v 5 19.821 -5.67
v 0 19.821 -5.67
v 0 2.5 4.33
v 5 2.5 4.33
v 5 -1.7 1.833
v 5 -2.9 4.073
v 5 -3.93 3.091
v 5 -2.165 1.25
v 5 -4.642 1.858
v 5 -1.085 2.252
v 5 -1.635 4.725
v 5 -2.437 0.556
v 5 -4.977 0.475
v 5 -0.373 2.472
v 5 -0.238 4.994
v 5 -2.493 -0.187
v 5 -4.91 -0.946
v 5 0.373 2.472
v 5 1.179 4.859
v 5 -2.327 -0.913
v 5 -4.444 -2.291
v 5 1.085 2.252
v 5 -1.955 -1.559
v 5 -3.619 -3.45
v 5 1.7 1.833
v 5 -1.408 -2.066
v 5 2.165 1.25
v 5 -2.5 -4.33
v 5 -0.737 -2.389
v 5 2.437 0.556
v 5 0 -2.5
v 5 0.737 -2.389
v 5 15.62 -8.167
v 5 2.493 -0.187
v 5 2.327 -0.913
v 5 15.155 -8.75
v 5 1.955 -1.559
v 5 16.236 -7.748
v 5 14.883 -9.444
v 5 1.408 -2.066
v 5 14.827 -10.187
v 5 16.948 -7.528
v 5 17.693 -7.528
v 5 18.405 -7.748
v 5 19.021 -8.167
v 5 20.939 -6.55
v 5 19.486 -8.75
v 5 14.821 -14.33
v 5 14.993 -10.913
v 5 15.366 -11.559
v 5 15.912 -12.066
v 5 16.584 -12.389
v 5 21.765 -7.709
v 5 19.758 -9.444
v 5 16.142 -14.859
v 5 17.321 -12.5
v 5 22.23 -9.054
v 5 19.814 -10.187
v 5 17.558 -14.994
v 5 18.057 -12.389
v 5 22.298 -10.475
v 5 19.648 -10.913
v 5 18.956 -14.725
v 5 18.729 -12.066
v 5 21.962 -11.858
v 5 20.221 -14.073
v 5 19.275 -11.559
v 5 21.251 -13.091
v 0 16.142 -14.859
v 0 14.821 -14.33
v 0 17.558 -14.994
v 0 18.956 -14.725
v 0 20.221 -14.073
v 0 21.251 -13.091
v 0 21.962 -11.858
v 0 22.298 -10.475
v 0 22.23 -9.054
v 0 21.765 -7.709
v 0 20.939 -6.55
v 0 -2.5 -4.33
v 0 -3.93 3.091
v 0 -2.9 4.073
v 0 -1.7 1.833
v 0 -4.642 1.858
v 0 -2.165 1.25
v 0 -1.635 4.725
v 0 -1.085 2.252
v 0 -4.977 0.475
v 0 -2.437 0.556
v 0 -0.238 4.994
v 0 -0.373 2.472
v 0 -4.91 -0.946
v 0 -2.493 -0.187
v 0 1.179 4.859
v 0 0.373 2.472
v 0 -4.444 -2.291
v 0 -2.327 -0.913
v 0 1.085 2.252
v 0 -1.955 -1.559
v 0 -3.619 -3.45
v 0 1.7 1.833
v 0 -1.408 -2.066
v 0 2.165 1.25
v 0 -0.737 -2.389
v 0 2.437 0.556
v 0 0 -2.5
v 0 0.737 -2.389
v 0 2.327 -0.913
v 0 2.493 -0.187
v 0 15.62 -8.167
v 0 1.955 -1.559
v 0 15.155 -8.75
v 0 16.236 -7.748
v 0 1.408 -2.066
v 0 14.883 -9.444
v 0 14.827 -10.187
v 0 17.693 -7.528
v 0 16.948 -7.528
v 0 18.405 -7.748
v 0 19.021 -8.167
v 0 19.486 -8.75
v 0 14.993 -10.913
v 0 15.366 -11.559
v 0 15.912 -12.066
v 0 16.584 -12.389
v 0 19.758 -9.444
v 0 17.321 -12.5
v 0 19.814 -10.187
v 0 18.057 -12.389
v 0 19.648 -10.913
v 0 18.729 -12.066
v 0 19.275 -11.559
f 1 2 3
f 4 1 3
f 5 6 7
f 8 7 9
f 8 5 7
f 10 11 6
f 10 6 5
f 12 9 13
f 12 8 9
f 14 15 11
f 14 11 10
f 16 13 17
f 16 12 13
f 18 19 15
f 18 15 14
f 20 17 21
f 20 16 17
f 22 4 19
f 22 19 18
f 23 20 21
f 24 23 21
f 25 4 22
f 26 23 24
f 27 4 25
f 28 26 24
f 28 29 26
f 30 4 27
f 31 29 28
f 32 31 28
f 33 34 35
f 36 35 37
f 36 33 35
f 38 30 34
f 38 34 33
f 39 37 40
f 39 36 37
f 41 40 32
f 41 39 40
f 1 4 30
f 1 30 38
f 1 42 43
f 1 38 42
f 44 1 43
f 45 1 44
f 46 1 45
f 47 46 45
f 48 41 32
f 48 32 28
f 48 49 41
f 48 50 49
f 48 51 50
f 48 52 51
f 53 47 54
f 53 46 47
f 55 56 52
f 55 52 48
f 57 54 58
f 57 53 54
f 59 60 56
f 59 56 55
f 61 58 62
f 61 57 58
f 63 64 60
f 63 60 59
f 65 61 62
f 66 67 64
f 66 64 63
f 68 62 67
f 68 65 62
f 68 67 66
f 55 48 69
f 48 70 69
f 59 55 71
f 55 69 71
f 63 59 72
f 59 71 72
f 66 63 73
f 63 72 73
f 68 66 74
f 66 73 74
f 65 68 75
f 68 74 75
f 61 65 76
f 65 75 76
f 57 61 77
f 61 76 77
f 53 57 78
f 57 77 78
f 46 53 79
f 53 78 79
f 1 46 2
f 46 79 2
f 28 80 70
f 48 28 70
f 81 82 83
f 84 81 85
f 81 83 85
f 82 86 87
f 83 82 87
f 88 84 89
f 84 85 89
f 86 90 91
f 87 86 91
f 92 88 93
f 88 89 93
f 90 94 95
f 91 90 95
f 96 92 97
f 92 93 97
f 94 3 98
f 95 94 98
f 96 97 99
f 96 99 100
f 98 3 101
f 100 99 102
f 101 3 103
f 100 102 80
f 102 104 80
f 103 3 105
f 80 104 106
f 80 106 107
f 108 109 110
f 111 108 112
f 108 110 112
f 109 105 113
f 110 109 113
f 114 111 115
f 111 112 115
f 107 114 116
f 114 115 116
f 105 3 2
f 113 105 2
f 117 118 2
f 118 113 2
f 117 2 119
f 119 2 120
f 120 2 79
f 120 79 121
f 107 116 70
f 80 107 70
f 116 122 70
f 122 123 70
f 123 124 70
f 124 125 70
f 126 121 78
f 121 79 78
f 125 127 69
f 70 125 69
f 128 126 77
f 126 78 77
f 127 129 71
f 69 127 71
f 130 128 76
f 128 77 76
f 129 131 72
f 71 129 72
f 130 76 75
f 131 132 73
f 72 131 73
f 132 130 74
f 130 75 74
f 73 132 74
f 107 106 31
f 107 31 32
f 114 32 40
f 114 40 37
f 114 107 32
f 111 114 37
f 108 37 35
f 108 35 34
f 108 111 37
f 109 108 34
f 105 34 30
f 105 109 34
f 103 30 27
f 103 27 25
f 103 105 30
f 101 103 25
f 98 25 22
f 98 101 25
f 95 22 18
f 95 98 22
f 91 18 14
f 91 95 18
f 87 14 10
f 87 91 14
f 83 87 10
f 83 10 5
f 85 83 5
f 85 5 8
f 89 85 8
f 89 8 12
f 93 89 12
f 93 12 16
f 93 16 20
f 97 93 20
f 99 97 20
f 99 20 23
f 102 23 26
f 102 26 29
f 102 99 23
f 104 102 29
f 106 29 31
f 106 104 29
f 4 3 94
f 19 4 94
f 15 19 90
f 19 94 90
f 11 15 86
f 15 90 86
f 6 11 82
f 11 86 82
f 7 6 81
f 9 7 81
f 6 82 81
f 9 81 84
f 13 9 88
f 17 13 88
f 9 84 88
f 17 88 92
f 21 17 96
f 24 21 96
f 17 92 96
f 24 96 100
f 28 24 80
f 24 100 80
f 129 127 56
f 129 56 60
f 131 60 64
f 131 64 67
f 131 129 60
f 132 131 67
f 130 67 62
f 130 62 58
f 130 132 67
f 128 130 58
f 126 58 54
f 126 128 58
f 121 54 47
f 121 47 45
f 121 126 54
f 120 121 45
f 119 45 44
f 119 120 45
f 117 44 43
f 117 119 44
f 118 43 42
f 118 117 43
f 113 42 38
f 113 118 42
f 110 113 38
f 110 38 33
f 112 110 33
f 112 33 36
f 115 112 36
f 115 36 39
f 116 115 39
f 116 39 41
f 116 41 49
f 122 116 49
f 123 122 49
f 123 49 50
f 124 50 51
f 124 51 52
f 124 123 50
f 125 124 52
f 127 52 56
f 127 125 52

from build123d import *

# Parameters (mm, degrees)
SKETCH1_R           = 5
SKETCH1_R_2         = 2.5
BOSS_EXTRUDE1_DEPTH = 5


with BuildPart() as part:
    # Sketch1 → Boss-Extrude1 (new body)
    # profile 1 of 3: a face of its own
    with BuildSketch(Plane(origin=(0, 0, 0), x_dir=(0, 0, -1), z_dir=(1, 0, 0))):
        with BuildLine():
            Line((5.669872981, 19.820508076), (-4.330127019, 2.5))
            ThreePointArc((-4.330127019, 2.5), (1.294095226, 4.829629131), (5, 0))
            ThreePointArc((5, 0), (4.829629131, -1.294095226), (4.330127019, -2.5))
            Line((4.330127019, -2.5), (14.330127019, 14.820508076))
            ThreePointArc((14.330127019, 14.820508076), (7.5, 12.990381057), (5.669872981, 19.820508076))
        make_face()
    # profile 2 of 3: a face of its own
    with BuildSketch(Plane(origin=(0, 0, 0), x_dir=(0, 0, -1), z_dir=(1, 0, 0))):
        with Locations((10, 17.320508076)):
            Circle(SKETCH1_R)
        with Locations((10, 17.320508076)):
            Circle(SKETCH1_R_2, mode=Mode.SUBTRACT)
    # profile 3 of 3: a face of its own
    with BuildSketch(Plane(origin=(0, 0, 0), x_dir=(0, 0, -1), z_dir=(1, 0, 0))):
        Circle(SKETCH1_R)
        Circle(SKETCH1_R_2, mode=Mode.SUBTRACT)
    extrude(amount=BOSS_EXTRUDE1_DEPTH)


solid = part.part
